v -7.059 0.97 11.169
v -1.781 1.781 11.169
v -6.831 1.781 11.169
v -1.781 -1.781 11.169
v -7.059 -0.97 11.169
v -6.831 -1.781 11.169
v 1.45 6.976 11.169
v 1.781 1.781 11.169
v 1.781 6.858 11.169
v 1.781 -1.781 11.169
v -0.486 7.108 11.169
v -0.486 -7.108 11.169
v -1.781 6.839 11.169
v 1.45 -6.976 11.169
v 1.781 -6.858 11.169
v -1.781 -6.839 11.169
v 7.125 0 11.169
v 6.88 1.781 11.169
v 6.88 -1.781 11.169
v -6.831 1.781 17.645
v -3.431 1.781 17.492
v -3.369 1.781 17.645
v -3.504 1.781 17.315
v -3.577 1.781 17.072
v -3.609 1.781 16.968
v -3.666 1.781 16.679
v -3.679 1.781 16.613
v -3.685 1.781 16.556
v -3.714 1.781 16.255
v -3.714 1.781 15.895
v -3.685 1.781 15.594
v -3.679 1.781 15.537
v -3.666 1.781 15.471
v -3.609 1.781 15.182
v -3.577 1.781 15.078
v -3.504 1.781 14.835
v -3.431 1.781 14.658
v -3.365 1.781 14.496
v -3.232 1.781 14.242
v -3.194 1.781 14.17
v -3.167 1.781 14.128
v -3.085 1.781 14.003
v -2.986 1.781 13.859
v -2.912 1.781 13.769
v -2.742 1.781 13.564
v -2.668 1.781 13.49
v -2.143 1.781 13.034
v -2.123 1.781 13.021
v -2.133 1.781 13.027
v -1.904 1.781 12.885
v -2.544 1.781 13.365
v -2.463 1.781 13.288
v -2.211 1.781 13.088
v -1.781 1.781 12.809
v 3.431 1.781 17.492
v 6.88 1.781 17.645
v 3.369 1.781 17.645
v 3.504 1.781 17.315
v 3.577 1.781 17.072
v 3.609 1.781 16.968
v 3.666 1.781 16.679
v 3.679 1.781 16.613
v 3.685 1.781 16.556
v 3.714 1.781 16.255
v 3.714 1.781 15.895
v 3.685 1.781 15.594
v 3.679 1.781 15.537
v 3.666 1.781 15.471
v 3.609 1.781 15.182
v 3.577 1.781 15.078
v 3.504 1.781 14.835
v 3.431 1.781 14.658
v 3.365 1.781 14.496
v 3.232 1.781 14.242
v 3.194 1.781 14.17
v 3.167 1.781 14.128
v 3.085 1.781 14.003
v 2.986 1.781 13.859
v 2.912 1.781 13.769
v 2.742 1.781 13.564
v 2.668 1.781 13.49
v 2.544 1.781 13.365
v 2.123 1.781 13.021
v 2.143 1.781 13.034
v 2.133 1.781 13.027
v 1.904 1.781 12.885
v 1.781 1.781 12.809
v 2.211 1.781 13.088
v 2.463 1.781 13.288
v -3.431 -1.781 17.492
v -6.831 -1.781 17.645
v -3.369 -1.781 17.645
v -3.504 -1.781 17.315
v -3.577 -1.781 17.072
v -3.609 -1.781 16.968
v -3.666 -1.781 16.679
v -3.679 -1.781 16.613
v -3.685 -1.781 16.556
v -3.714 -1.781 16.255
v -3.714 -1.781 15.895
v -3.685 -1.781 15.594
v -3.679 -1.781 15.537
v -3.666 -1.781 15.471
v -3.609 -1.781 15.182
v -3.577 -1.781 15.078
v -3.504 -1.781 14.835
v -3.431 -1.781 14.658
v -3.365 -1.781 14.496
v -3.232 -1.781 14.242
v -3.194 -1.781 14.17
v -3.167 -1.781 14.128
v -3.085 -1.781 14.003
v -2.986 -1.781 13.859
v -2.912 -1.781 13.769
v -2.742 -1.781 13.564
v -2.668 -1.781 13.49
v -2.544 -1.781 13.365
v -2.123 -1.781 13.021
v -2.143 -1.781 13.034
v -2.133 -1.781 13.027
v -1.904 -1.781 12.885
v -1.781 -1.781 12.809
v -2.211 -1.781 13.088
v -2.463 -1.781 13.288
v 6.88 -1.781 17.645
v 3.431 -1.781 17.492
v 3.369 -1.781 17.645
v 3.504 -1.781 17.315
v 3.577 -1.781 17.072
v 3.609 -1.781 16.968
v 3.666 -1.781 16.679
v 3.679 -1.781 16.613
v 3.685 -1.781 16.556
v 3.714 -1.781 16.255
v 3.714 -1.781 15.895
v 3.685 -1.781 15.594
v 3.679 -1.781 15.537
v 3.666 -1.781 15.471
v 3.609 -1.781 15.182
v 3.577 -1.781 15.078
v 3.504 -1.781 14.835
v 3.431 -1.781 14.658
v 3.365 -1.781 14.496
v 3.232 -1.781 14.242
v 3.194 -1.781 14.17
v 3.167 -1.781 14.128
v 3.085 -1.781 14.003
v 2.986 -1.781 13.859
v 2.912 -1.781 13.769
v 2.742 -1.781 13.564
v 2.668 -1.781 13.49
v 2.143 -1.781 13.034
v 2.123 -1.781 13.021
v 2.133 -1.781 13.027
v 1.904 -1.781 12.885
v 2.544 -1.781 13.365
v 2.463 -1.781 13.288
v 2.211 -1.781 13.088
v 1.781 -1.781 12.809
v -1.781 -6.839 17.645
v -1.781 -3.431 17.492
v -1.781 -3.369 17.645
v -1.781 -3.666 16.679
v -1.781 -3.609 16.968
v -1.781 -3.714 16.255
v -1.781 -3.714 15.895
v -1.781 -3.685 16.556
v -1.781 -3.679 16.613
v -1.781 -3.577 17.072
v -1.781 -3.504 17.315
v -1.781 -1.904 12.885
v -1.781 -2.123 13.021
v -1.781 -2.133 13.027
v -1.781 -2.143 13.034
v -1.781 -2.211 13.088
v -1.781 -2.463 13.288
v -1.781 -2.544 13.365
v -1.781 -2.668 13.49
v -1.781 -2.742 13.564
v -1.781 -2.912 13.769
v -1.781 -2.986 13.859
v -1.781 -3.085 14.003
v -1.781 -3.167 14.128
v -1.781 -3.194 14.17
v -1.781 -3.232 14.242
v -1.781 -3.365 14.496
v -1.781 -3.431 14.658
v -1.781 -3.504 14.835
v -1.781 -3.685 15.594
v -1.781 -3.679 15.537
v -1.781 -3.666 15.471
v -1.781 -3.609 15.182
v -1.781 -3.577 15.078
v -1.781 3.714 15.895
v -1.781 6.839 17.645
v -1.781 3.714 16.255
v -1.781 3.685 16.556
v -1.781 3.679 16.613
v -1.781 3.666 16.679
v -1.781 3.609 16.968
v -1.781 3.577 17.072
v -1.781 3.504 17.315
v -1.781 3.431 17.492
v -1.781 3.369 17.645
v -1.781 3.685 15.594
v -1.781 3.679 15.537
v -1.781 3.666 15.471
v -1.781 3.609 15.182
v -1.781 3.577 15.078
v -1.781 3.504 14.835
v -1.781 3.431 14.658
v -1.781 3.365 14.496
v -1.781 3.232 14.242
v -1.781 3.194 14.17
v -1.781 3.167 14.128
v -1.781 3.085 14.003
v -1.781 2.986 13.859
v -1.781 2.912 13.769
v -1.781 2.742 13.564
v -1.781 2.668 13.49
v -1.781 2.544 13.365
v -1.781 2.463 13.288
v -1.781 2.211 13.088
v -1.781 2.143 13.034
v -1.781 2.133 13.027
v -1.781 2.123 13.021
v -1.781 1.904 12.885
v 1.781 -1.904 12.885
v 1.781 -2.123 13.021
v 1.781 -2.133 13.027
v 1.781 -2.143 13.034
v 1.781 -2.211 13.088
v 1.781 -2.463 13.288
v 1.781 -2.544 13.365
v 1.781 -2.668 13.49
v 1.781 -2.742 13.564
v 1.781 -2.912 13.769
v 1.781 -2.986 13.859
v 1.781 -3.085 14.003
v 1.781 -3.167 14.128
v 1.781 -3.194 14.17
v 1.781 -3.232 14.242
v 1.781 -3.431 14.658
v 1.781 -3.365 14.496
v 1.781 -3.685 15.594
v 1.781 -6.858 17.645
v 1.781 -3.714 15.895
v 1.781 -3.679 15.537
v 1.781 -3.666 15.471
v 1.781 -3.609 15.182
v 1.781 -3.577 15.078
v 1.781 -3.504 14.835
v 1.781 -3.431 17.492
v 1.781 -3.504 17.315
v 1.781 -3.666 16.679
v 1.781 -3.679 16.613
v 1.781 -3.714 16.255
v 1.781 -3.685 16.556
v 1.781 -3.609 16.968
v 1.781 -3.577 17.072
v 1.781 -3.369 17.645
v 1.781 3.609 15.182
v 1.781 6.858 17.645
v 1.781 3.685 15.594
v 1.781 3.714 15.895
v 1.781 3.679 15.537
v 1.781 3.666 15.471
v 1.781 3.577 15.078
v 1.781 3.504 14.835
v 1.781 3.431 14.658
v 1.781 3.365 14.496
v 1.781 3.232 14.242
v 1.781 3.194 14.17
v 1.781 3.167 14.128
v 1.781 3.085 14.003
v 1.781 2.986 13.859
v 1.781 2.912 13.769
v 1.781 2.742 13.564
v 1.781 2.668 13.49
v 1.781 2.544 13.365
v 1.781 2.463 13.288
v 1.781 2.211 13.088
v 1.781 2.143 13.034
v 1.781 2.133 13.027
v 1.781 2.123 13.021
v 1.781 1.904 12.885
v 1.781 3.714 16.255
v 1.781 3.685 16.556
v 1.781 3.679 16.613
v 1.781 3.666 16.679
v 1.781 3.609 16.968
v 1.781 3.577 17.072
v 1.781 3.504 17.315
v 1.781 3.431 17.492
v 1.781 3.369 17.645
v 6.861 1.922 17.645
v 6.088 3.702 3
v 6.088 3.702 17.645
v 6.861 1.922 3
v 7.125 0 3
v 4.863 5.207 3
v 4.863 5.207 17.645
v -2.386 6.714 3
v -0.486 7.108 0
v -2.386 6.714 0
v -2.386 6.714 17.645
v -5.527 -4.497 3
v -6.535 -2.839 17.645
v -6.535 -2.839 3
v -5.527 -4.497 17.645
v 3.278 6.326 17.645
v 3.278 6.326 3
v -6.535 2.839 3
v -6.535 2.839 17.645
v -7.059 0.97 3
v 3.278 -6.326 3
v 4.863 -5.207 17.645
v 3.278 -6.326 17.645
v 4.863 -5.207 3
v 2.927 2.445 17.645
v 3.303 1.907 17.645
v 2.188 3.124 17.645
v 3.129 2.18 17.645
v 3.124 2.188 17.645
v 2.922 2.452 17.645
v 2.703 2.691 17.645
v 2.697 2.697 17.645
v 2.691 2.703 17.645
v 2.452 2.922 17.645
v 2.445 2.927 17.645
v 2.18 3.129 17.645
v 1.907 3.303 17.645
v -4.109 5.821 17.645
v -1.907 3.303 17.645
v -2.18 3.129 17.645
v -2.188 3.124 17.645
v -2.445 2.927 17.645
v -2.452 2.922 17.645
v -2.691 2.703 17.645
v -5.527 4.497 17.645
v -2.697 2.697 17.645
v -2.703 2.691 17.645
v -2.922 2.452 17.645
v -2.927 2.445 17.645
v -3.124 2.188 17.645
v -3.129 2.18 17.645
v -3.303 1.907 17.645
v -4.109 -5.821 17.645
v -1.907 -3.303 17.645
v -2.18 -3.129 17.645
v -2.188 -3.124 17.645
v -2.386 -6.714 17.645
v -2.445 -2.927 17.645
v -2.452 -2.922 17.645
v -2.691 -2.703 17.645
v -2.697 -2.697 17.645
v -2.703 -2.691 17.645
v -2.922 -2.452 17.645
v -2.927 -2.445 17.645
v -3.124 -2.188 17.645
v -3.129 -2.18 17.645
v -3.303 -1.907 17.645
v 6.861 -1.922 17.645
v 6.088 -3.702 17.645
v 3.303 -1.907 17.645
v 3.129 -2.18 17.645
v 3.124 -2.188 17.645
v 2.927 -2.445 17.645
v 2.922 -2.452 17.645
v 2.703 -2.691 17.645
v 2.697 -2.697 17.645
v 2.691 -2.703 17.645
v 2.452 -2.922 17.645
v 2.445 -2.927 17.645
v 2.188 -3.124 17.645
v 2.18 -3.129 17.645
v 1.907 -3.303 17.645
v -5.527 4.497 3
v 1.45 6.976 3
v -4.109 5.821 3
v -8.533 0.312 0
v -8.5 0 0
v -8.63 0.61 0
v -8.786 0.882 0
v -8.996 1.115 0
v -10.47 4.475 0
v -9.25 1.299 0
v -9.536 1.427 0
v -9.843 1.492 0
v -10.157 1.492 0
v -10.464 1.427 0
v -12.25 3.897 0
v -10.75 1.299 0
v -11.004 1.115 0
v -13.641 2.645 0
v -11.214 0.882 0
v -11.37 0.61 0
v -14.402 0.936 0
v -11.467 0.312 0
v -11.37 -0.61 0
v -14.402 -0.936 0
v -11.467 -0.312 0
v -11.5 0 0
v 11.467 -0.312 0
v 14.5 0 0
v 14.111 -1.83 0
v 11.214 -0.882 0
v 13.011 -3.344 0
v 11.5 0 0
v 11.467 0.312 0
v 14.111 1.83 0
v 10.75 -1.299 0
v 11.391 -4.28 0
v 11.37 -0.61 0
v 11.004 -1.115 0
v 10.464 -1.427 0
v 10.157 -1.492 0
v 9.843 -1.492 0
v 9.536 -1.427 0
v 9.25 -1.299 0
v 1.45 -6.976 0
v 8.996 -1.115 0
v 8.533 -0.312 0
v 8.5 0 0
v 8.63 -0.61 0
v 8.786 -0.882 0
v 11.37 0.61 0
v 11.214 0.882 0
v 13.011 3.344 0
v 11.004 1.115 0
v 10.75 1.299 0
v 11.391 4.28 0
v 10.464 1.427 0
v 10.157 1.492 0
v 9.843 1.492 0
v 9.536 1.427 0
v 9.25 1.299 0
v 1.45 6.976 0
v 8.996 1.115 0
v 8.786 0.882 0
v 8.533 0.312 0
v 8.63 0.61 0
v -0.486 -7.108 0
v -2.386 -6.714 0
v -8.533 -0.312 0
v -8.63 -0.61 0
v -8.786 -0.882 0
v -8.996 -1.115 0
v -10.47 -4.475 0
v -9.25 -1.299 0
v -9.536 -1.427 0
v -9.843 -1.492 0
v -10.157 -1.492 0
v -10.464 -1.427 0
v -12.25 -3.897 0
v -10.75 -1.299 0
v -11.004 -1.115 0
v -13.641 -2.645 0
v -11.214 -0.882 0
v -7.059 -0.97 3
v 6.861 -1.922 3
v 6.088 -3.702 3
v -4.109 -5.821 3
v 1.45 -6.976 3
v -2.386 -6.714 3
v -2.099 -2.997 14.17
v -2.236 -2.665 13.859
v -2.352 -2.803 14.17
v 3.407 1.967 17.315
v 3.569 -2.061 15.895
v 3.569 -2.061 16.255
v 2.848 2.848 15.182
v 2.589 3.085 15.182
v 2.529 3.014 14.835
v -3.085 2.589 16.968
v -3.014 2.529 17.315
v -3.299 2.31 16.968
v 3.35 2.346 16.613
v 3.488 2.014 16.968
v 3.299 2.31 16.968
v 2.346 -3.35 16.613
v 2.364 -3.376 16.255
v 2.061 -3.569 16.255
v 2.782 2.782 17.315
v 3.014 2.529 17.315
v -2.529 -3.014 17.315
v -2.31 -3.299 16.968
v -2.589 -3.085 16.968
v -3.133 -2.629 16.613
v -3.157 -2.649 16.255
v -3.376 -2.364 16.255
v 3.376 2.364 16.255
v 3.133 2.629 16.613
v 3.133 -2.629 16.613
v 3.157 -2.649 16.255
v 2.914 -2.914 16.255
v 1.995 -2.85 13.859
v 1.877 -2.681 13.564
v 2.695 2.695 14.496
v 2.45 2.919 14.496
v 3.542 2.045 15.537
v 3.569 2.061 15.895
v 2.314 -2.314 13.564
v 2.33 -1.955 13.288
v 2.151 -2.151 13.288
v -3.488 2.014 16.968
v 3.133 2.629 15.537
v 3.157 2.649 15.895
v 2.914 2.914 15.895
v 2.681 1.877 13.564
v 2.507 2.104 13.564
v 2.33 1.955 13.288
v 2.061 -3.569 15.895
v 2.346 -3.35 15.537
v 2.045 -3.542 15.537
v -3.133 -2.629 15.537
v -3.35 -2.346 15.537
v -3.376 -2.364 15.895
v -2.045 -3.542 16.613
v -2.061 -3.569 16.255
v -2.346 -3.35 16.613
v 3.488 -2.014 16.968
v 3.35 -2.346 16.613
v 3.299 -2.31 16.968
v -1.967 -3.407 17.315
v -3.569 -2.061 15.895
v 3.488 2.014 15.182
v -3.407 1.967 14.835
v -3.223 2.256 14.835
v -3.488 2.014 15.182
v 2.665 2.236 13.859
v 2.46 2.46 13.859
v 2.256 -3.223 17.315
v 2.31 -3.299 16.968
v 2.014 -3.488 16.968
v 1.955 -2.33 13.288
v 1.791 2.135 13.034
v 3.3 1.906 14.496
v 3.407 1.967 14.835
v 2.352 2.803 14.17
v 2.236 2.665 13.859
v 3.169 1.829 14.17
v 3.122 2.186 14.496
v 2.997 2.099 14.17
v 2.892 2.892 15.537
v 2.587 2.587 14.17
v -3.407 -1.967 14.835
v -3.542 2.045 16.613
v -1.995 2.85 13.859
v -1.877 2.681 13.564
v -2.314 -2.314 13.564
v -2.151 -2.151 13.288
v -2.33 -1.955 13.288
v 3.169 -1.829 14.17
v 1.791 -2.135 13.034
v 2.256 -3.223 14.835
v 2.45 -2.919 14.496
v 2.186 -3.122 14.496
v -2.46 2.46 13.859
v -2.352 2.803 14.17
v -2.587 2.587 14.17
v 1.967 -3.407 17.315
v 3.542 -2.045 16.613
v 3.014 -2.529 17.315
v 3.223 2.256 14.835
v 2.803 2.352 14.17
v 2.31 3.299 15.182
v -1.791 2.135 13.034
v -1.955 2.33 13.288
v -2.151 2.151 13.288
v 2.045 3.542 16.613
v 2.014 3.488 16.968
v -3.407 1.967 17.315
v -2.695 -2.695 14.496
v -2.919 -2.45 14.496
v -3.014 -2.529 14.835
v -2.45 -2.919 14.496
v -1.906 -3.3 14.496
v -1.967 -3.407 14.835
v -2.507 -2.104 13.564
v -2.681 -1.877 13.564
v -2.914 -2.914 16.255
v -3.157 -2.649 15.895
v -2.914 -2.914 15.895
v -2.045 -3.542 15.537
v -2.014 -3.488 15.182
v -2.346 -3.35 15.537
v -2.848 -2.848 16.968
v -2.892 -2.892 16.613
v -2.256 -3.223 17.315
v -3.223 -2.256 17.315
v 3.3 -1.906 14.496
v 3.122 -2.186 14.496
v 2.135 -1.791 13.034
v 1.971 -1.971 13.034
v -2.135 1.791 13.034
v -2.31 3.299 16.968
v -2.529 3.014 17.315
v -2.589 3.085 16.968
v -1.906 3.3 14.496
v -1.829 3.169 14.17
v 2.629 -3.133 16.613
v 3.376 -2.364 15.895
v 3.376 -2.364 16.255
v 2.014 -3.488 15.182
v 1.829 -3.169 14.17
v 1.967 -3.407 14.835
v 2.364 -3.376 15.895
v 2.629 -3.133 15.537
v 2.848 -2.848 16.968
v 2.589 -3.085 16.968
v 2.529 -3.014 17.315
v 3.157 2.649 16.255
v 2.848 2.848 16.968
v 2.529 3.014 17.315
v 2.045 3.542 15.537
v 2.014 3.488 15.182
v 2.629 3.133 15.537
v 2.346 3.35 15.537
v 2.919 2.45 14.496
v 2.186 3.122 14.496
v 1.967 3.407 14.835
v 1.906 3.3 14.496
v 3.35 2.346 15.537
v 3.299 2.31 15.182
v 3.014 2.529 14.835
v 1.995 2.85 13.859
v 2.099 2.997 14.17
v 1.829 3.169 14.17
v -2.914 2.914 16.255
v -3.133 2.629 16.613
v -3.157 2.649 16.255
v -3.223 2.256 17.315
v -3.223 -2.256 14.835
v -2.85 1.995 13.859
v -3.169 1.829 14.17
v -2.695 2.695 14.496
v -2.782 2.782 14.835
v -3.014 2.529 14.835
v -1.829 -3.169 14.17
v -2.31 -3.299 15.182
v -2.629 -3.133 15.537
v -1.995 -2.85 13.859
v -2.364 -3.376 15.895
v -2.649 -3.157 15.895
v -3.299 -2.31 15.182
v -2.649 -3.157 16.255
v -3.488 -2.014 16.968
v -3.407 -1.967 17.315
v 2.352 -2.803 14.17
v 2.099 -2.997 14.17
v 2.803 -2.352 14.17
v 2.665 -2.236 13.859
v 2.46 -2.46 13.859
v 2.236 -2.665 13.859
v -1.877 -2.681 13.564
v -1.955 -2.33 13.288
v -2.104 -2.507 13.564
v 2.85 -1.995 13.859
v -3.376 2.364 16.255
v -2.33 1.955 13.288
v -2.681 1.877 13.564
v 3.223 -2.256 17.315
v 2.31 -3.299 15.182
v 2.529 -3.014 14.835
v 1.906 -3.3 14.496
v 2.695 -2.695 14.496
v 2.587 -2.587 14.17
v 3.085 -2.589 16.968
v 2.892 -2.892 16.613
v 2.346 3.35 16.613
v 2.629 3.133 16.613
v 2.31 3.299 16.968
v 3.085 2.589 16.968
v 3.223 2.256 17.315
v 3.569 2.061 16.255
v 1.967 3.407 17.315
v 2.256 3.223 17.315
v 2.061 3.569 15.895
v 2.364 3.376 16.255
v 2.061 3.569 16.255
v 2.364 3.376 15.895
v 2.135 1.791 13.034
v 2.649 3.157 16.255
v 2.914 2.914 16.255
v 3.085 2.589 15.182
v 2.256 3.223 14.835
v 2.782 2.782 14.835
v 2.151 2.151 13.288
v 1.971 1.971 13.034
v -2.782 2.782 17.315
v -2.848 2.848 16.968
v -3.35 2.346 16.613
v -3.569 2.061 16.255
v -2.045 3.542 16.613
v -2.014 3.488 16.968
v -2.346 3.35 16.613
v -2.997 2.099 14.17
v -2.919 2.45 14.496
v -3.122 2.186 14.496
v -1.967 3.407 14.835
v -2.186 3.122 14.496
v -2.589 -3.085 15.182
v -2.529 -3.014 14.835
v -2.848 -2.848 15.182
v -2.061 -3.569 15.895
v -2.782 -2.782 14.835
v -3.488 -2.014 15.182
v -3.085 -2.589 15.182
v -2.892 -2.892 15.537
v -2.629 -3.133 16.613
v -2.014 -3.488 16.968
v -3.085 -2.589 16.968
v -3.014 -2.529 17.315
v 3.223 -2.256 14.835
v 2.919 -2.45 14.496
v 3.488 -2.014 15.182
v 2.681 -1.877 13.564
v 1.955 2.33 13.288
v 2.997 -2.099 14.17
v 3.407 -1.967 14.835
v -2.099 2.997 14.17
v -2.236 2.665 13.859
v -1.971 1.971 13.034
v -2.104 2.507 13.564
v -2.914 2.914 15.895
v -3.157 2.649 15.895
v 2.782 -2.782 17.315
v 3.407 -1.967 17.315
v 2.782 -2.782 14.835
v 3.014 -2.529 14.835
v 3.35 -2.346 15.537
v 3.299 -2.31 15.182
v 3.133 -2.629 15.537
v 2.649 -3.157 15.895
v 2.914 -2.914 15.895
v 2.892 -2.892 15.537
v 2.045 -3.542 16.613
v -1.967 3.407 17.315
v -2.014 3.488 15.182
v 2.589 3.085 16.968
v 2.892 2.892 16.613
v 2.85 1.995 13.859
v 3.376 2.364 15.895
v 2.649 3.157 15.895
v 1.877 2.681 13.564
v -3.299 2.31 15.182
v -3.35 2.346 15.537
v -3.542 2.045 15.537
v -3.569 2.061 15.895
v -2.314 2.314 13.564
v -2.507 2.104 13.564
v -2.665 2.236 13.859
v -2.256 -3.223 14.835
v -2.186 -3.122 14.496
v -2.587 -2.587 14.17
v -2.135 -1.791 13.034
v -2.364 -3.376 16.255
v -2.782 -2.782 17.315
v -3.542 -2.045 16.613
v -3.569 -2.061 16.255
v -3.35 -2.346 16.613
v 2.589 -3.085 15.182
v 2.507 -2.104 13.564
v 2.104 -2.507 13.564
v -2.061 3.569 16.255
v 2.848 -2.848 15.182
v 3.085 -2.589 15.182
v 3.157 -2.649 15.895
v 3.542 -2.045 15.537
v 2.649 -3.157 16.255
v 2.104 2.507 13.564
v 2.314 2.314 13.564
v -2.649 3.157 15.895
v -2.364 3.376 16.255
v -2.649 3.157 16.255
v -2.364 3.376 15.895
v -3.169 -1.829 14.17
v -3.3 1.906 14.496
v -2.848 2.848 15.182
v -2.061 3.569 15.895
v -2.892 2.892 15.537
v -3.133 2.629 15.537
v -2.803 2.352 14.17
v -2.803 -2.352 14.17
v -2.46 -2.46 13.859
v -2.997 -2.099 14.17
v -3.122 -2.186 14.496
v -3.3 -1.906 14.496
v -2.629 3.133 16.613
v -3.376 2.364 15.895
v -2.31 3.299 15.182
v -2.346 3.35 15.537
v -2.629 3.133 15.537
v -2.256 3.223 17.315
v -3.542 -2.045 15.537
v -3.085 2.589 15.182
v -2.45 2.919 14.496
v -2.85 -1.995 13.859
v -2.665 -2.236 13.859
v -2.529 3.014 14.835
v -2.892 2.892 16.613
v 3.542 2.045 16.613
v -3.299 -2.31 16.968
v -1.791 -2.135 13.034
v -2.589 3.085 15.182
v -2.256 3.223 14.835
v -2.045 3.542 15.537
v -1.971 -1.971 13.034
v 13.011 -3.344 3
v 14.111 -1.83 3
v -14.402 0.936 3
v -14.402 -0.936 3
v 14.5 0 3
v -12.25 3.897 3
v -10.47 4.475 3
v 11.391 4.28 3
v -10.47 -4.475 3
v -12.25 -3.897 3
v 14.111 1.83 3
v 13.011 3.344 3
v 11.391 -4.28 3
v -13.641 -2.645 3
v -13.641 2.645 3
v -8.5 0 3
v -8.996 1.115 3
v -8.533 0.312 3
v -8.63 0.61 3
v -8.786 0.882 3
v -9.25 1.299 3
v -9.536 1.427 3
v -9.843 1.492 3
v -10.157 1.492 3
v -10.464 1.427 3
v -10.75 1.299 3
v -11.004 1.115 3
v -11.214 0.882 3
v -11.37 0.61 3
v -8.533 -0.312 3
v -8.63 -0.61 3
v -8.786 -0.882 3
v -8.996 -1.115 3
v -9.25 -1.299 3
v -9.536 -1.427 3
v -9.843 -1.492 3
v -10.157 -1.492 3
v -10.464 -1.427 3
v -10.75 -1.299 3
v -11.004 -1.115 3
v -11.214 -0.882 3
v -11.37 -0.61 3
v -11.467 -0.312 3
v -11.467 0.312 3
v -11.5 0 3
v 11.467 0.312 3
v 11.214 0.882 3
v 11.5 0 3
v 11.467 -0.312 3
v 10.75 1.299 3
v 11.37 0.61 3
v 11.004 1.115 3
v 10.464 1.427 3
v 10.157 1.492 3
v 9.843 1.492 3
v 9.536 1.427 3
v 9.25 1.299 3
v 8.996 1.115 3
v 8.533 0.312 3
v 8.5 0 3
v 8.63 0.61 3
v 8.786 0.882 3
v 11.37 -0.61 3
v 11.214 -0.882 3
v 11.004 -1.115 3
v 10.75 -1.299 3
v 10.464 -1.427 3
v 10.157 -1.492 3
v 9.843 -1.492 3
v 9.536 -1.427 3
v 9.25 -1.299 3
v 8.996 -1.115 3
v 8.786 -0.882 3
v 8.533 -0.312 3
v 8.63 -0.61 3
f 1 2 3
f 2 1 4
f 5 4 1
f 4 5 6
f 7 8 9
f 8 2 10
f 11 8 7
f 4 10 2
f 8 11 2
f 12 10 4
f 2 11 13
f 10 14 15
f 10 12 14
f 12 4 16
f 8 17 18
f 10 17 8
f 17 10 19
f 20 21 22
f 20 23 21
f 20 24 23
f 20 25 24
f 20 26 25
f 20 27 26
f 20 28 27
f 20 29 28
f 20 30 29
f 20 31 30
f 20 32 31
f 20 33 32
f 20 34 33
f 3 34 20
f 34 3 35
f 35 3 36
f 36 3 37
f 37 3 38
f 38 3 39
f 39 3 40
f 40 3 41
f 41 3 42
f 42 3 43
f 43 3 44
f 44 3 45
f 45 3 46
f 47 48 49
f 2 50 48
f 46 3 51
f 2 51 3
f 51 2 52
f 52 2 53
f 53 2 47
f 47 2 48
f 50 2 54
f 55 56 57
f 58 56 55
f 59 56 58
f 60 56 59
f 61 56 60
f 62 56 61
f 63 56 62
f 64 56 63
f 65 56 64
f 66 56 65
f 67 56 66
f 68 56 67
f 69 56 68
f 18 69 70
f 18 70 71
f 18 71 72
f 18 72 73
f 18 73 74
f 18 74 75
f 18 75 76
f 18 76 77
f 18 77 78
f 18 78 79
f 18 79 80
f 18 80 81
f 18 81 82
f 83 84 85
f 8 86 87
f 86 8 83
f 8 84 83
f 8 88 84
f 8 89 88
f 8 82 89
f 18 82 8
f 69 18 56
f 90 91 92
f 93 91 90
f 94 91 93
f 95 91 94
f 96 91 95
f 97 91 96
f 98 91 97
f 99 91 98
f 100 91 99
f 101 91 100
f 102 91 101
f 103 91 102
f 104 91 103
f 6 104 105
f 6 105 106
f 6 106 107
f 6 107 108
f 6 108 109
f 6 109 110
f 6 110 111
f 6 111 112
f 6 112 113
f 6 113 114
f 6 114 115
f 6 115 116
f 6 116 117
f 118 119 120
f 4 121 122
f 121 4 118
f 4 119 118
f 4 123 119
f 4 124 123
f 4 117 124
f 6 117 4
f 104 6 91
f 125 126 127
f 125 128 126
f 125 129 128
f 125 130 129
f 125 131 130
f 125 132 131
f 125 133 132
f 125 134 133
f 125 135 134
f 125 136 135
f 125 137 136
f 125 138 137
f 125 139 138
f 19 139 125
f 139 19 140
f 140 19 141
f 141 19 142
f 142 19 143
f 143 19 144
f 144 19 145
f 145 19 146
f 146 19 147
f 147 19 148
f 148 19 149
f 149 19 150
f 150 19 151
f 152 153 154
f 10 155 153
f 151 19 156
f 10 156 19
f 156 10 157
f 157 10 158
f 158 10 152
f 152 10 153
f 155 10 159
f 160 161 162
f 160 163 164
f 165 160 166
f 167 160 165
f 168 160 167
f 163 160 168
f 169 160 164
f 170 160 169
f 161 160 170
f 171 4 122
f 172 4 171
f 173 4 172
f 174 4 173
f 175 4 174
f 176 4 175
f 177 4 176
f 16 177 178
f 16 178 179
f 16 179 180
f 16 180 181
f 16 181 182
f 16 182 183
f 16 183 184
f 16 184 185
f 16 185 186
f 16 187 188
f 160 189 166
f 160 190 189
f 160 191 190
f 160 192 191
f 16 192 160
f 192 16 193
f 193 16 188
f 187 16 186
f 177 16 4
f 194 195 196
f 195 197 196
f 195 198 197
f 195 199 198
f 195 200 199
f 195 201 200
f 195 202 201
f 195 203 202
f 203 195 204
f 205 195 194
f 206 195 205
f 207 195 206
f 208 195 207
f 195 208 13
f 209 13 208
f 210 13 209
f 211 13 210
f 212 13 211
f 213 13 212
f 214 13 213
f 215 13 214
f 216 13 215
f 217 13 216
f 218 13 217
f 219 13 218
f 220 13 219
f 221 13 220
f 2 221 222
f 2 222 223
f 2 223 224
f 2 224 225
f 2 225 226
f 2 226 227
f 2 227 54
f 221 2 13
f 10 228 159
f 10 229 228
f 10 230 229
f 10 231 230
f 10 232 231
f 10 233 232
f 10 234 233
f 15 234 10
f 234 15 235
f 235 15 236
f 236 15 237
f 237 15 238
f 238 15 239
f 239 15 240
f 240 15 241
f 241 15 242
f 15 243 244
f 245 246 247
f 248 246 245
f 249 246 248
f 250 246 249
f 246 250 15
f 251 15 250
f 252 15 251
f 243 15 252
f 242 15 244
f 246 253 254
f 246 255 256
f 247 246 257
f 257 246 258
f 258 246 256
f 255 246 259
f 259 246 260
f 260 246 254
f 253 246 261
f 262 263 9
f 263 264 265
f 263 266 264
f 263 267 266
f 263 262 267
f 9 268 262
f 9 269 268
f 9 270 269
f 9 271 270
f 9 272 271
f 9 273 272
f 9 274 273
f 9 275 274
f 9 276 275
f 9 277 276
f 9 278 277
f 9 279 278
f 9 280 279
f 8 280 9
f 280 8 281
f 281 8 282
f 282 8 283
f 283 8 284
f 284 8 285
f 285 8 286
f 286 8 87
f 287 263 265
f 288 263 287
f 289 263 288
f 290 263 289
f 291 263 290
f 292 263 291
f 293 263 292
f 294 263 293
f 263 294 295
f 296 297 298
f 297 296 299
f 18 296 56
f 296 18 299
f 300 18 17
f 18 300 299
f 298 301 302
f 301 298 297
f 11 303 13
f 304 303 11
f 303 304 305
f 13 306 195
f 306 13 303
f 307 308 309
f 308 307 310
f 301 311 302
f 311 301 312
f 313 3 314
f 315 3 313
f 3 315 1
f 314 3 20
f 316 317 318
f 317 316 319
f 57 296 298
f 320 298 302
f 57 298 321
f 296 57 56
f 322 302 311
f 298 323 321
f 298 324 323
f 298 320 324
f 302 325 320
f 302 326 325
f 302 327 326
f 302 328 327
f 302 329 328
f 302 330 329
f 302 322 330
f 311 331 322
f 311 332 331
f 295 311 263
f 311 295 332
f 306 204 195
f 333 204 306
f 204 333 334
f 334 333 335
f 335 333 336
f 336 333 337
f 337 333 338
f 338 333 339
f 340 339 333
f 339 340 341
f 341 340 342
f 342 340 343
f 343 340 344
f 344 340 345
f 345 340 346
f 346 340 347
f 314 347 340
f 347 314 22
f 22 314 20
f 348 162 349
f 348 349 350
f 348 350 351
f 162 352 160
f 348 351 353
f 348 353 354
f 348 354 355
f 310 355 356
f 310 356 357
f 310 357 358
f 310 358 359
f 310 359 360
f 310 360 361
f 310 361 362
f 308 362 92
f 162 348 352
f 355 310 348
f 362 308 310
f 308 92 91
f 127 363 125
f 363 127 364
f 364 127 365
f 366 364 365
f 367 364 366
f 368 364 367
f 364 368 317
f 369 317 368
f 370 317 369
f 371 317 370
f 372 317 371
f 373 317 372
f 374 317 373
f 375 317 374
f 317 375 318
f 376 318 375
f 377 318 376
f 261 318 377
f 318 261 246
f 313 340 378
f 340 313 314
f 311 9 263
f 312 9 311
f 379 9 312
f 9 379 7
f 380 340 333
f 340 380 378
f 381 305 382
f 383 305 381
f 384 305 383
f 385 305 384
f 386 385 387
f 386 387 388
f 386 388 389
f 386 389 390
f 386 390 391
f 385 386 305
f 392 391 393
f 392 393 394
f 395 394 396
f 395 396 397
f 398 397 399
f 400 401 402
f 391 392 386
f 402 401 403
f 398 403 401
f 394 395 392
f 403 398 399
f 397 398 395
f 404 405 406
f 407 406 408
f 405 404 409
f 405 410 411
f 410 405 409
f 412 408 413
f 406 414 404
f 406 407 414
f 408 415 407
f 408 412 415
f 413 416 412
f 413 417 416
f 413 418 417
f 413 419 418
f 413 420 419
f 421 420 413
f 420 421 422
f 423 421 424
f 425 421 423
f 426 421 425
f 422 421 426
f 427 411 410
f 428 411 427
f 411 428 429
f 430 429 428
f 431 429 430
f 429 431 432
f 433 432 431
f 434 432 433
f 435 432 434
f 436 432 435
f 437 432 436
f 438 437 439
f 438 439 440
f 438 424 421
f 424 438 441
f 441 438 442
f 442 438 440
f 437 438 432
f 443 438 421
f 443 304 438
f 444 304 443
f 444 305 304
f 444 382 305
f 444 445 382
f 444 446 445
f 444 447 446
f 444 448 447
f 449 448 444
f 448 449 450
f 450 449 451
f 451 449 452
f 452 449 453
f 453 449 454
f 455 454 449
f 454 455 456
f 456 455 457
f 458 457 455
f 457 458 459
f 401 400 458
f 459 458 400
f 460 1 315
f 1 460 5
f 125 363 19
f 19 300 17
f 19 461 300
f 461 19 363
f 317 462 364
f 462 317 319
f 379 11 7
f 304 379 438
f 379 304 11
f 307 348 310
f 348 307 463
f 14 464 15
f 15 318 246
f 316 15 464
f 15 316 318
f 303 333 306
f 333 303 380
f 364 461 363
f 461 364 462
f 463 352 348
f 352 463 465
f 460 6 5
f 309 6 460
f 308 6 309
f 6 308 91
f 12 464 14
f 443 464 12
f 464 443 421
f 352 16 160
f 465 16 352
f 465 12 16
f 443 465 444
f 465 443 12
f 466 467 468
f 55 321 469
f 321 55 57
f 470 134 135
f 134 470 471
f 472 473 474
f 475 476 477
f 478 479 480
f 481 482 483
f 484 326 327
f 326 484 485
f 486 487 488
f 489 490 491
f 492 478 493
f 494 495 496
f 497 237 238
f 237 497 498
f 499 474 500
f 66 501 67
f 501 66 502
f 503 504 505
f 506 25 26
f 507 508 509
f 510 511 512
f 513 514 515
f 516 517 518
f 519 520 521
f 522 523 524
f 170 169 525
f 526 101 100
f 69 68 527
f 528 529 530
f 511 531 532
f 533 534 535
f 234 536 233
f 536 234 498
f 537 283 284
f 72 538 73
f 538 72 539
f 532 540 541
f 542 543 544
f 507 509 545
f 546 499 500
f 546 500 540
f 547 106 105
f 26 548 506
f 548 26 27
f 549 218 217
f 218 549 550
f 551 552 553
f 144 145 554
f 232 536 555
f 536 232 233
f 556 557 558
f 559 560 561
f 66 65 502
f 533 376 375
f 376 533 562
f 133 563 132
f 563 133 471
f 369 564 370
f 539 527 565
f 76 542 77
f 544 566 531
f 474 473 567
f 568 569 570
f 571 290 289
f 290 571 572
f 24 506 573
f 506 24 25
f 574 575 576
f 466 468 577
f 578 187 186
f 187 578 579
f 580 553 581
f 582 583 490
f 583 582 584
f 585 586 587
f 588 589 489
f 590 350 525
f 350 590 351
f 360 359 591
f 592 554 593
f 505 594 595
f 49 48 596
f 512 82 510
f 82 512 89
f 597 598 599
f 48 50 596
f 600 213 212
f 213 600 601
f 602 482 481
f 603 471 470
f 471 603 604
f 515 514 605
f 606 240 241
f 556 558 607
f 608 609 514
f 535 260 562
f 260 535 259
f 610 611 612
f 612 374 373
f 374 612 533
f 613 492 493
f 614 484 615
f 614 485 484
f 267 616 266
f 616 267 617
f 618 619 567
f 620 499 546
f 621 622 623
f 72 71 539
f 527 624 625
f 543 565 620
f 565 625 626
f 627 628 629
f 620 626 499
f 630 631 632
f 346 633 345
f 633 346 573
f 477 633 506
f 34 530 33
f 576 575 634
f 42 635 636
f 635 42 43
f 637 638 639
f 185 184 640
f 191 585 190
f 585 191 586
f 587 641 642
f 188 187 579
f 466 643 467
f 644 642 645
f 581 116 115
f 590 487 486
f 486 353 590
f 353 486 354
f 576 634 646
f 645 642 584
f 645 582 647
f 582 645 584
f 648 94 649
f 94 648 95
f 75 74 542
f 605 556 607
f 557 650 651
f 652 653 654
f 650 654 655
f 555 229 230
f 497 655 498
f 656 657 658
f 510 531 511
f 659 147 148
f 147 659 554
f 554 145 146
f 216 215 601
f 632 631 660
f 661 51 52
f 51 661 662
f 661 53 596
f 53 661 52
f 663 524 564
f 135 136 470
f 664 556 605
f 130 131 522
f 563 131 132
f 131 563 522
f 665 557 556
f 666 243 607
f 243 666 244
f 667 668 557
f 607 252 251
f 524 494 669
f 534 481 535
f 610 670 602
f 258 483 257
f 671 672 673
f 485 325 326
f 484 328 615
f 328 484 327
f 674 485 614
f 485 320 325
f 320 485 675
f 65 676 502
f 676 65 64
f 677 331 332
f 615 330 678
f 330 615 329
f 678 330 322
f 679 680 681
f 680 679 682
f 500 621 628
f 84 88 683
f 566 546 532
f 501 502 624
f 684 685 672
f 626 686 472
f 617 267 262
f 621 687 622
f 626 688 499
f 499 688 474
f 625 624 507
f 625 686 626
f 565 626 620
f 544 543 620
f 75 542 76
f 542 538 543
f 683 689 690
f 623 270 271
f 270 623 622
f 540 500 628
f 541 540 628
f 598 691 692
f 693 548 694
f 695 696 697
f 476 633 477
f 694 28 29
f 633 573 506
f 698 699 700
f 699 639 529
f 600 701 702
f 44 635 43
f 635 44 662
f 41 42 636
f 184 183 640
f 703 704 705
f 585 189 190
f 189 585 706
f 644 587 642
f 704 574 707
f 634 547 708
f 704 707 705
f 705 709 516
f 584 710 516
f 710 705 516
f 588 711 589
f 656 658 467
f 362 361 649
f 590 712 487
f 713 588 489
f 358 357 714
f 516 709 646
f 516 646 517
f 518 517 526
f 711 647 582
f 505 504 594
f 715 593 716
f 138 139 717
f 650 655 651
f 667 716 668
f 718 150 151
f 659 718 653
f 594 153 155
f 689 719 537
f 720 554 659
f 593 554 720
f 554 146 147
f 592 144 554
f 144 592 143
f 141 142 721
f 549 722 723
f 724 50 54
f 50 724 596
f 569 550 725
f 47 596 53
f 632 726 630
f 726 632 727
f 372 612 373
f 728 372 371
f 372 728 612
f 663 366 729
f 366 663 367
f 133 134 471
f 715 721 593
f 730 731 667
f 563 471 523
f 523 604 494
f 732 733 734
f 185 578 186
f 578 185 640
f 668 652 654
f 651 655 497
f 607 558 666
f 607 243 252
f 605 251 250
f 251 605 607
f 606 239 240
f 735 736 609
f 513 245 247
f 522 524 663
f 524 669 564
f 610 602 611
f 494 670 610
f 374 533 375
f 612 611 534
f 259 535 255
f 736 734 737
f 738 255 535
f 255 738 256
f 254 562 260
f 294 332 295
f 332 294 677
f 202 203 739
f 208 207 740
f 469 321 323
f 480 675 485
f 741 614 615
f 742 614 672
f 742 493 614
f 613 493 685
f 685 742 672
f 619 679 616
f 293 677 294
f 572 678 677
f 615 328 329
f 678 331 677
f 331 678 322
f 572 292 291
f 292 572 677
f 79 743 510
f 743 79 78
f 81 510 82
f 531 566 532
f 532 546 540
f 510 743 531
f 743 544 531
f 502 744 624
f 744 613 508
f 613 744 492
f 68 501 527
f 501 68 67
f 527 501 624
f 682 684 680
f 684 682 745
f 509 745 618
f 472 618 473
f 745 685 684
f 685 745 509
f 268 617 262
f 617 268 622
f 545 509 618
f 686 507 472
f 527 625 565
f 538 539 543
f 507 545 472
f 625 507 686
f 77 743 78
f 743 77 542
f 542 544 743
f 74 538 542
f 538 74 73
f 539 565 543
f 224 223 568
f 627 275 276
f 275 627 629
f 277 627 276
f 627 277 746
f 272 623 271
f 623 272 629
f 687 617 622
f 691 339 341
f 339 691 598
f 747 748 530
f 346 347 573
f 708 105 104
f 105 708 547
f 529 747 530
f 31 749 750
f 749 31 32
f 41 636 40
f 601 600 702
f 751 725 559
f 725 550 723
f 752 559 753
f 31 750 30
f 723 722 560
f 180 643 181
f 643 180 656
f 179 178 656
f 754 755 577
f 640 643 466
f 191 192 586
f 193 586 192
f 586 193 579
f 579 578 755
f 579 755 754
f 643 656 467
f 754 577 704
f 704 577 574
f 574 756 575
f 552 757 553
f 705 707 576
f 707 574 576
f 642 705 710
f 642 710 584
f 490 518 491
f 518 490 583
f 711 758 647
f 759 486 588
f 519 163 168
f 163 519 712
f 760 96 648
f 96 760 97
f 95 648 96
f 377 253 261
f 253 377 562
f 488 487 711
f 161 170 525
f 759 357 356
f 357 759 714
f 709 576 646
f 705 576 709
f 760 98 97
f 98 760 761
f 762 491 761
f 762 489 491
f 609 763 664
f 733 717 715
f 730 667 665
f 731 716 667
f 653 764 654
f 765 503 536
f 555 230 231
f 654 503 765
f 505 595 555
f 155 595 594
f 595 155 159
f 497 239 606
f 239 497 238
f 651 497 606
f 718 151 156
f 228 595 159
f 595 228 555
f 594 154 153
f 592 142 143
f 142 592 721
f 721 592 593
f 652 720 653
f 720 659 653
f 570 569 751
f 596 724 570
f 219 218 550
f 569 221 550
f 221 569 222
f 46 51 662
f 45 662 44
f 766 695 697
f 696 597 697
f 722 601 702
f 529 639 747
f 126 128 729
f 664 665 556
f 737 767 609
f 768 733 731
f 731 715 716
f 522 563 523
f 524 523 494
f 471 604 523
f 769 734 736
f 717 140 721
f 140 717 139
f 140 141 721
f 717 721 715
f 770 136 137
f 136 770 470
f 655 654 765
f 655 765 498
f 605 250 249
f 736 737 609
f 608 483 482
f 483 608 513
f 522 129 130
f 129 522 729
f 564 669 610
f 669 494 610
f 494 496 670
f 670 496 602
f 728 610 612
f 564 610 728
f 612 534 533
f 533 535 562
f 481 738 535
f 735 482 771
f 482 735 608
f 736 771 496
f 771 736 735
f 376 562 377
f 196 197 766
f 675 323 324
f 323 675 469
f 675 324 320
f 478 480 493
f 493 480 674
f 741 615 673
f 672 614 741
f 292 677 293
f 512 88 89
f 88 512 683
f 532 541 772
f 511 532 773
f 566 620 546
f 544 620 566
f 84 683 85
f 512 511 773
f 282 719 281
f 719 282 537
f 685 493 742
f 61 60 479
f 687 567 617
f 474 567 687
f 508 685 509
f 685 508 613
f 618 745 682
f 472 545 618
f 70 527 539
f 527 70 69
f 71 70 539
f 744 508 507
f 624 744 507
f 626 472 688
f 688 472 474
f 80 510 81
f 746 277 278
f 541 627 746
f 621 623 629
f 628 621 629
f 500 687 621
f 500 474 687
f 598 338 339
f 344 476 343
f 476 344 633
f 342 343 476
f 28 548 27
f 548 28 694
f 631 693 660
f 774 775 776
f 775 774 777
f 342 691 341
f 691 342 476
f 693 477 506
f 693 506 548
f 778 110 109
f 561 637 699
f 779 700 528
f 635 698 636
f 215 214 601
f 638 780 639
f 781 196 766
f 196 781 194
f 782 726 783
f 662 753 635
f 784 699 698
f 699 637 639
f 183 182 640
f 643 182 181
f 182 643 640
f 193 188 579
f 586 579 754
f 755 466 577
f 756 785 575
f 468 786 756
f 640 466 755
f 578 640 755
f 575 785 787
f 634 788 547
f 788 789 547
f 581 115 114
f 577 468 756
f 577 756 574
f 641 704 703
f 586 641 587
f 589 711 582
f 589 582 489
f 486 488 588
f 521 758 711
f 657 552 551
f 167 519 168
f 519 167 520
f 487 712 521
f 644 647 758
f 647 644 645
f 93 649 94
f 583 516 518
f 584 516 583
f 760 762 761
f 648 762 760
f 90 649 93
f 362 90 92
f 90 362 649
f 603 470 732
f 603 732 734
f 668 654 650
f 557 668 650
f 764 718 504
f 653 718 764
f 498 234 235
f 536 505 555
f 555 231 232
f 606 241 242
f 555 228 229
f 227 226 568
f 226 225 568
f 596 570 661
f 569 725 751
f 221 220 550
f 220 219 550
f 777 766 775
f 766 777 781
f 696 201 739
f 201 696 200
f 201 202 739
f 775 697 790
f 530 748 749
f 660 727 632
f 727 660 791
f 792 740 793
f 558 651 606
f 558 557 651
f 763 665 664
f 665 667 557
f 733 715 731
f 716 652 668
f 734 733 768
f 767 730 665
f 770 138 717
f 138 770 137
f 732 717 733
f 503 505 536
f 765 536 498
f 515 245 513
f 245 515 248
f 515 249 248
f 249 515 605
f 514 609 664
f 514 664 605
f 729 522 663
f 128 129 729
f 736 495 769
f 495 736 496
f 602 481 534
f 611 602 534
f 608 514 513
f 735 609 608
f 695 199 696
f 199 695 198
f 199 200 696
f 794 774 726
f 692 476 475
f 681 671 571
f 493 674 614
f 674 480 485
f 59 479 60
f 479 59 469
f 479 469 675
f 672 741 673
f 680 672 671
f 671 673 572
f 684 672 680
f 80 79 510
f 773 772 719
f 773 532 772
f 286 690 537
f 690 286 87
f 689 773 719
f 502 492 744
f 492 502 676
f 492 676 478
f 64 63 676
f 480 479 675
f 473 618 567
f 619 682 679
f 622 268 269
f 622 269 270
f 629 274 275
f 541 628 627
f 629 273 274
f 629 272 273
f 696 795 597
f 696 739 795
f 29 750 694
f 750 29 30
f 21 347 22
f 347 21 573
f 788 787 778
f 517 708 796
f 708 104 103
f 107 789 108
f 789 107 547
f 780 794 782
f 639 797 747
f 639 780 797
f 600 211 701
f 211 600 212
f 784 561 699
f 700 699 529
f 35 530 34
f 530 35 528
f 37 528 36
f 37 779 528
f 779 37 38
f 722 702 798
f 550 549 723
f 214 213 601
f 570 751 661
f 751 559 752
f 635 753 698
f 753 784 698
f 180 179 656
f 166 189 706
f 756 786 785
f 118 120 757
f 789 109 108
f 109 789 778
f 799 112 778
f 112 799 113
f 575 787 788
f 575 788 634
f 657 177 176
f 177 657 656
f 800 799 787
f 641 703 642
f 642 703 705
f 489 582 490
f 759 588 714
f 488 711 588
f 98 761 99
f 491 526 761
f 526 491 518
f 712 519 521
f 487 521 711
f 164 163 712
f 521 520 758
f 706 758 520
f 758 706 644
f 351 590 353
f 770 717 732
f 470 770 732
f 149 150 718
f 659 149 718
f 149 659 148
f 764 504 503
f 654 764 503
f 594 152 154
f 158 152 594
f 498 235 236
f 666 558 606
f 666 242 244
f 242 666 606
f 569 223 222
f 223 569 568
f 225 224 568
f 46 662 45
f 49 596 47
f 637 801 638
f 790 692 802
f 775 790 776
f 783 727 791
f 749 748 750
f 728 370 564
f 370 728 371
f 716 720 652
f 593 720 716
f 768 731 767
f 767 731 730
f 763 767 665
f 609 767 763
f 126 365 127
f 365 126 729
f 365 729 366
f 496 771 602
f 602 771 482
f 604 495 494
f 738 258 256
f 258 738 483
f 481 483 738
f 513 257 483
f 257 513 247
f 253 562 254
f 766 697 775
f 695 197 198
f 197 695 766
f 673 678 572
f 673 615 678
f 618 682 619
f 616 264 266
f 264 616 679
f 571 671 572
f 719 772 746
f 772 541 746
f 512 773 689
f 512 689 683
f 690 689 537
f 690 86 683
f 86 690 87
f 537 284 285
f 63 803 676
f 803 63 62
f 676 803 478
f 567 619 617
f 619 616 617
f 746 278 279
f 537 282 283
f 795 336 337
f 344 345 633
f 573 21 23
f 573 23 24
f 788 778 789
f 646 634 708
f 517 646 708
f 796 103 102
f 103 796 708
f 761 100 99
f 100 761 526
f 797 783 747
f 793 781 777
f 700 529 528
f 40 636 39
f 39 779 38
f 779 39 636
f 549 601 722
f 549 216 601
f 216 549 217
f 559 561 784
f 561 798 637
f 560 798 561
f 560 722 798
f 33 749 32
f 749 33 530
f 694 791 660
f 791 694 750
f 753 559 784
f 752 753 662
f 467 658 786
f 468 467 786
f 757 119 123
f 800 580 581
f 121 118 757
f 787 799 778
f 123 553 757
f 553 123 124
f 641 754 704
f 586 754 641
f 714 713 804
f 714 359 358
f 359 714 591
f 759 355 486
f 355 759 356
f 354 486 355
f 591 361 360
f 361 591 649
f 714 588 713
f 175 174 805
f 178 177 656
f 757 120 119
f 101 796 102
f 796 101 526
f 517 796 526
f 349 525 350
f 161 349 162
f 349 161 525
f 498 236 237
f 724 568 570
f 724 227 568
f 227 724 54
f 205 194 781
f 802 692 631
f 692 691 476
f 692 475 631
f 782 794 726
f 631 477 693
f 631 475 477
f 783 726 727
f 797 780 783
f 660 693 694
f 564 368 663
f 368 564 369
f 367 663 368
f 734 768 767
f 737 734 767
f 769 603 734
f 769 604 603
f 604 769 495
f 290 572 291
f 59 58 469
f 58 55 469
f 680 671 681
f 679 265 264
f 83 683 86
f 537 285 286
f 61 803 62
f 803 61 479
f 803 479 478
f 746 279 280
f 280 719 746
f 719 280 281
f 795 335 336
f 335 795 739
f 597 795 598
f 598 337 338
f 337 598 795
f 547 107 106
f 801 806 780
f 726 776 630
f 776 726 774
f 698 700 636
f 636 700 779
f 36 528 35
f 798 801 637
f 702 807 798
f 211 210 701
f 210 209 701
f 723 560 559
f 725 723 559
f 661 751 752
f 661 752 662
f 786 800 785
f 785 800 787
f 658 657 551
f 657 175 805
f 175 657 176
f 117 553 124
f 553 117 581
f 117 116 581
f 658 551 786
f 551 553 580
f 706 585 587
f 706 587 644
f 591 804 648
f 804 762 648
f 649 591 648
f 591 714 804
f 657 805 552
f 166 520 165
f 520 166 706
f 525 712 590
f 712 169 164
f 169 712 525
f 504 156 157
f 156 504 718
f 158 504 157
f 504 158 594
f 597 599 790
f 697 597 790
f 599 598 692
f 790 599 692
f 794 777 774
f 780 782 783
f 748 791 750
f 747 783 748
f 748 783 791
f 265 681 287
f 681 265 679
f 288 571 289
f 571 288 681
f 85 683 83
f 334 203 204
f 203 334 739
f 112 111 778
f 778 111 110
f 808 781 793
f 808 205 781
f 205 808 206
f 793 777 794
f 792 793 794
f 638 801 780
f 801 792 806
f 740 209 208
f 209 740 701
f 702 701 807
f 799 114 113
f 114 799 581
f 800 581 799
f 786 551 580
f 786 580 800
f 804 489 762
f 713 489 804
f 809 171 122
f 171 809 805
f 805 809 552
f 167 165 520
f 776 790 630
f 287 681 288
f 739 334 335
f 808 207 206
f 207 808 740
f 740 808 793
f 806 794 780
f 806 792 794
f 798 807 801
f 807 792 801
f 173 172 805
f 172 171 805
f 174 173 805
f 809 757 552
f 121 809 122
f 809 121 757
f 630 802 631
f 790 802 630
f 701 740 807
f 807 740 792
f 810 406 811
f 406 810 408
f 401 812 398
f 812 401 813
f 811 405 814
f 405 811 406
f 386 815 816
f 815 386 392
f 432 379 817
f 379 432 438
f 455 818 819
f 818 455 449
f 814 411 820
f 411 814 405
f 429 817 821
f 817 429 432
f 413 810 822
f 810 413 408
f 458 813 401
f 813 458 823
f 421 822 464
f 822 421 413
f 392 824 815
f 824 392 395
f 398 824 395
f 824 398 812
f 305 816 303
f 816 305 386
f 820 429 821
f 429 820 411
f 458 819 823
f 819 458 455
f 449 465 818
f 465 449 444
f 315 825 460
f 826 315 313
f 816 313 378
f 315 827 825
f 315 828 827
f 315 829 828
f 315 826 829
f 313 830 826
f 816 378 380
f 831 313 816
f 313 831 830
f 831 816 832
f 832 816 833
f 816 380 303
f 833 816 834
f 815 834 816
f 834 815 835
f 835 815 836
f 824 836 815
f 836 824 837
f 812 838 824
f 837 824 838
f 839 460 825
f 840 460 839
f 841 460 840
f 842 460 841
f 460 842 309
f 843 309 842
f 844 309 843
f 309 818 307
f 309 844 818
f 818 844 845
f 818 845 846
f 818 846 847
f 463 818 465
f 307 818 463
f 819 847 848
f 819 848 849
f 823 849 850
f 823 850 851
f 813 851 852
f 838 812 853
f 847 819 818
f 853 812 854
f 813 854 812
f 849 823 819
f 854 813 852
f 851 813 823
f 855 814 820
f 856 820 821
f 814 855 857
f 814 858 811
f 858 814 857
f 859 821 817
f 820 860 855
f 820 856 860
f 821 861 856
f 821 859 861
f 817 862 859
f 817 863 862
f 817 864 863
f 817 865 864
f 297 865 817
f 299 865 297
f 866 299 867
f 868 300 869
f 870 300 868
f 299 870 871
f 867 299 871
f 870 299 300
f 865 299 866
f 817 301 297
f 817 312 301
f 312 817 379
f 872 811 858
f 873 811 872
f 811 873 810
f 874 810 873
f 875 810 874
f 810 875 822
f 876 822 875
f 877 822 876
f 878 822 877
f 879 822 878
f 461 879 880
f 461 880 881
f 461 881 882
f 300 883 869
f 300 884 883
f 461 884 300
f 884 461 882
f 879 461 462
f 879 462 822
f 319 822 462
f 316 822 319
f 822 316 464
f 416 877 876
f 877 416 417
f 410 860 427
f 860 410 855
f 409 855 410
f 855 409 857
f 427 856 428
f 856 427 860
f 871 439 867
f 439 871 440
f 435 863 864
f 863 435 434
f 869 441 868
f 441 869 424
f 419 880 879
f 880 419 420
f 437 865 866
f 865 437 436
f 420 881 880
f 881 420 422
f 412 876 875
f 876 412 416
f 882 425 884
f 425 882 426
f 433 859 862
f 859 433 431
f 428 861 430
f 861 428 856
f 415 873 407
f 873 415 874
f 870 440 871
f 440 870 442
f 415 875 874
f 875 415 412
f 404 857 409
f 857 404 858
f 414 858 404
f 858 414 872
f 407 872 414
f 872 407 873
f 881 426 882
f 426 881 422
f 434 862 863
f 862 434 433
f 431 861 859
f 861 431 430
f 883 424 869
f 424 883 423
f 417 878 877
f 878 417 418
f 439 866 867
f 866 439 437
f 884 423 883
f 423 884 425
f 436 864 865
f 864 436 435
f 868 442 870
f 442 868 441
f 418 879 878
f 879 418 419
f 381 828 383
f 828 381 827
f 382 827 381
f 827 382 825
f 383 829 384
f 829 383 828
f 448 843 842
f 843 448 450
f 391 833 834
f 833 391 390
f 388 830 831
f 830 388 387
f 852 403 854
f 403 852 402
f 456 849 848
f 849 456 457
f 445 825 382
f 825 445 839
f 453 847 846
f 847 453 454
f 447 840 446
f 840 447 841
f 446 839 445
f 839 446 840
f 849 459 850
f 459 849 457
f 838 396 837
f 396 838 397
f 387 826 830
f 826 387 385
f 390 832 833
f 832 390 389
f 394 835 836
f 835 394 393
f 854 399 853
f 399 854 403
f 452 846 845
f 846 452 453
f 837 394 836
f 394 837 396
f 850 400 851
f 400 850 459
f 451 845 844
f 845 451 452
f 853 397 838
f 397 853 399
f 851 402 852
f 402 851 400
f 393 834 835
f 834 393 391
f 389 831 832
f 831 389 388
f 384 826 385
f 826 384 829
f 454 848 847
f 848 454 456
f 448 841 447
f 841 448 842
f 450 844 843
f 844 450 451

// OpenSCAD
WallThickness = 3;
//BallSize = 13; te ruim
//BallSize = 12.7; bijna
//BallSize = 12.4;goed
BallSize = 7.85;
Airgap = .2;
Mount = 3;
TotalHeight = 20; 		//this includes the ball
MountScrewRad = 1.5;  	//3mm screw
BallProtrude = .30; 	//percentage of ball radius sticking out 
ScrewSpacing = 20;		//spaceing of the mountholes center to center
MountMiddle = false; 	//mount int the center
MountBase = true;		//use mount base 2 holes


cylrad = (BallSize/2) + WallThickness + Airgap;
echo (cylrad);


difference()
{
	union()
	{
		ball_mount ();
		if(MountBase)
		{		
			base();
		}
	}
	if(MountMiddle)
	{
		cylinder(r1 = MountScrewRad, r2 = MountScrewRad, h= TotalHeight,center=true, $fn=30);
		translate([0,0,(TotalHeight-BallSize)/2]) 
		{
			cylinder(r1 = MountScrewRad*2, r2 = MountScrewRad*2, h= TotalHeight, $fn=30);
		}
	}
}

module ball_mount ()
{
	difference () 
	{
		cylinder(r1 = cylrad , r2 = cylrad,  TotalHeight - (BallSize*BallProtrude));
	
		translate([0,0,TotalHeight - BallSize/2]) 
		{
			cube(size = [cylrad*2+5, cylrad/2, BallSize*1.25], center = true );
			rotate([0,0,90]) cube(size = [cylrad*2+5, cylrad/2, BallSize*1.25], center = true );
		}
	
		translate([0,0,TotalHeight - (BallSize/2)]) 
		{
			sphere (BallSize/2+Airgap, $fa=5, $fs=0.1);
		}
	}
}
module base()
{
	difference (){
		linear_extrude(height=Mount)
		hull() {
			translate([ScrewSpacing/2,0,0]) {
				circle(  MountScrewRad*3);
			}
			translate([0-ScrewSpacing/2,0,0]) {
				circle( MountScrewRad*3);
			}
			circle( cylrad);
		}
	
		translate([ScrewSpacing/2,0,-1]) {
			#cylinder(r1 = MountScrewRad, r2 = MountScrewRad, h= Mount+2,$fn=30);
		}
		translate([0-ScrewSpacing/2,0,-1]) {
			#cylinder(r1 = MountScrewRad, r2 = MountScrewRad, h= Mount+2,$fn=30);
			
		}
	}
}
